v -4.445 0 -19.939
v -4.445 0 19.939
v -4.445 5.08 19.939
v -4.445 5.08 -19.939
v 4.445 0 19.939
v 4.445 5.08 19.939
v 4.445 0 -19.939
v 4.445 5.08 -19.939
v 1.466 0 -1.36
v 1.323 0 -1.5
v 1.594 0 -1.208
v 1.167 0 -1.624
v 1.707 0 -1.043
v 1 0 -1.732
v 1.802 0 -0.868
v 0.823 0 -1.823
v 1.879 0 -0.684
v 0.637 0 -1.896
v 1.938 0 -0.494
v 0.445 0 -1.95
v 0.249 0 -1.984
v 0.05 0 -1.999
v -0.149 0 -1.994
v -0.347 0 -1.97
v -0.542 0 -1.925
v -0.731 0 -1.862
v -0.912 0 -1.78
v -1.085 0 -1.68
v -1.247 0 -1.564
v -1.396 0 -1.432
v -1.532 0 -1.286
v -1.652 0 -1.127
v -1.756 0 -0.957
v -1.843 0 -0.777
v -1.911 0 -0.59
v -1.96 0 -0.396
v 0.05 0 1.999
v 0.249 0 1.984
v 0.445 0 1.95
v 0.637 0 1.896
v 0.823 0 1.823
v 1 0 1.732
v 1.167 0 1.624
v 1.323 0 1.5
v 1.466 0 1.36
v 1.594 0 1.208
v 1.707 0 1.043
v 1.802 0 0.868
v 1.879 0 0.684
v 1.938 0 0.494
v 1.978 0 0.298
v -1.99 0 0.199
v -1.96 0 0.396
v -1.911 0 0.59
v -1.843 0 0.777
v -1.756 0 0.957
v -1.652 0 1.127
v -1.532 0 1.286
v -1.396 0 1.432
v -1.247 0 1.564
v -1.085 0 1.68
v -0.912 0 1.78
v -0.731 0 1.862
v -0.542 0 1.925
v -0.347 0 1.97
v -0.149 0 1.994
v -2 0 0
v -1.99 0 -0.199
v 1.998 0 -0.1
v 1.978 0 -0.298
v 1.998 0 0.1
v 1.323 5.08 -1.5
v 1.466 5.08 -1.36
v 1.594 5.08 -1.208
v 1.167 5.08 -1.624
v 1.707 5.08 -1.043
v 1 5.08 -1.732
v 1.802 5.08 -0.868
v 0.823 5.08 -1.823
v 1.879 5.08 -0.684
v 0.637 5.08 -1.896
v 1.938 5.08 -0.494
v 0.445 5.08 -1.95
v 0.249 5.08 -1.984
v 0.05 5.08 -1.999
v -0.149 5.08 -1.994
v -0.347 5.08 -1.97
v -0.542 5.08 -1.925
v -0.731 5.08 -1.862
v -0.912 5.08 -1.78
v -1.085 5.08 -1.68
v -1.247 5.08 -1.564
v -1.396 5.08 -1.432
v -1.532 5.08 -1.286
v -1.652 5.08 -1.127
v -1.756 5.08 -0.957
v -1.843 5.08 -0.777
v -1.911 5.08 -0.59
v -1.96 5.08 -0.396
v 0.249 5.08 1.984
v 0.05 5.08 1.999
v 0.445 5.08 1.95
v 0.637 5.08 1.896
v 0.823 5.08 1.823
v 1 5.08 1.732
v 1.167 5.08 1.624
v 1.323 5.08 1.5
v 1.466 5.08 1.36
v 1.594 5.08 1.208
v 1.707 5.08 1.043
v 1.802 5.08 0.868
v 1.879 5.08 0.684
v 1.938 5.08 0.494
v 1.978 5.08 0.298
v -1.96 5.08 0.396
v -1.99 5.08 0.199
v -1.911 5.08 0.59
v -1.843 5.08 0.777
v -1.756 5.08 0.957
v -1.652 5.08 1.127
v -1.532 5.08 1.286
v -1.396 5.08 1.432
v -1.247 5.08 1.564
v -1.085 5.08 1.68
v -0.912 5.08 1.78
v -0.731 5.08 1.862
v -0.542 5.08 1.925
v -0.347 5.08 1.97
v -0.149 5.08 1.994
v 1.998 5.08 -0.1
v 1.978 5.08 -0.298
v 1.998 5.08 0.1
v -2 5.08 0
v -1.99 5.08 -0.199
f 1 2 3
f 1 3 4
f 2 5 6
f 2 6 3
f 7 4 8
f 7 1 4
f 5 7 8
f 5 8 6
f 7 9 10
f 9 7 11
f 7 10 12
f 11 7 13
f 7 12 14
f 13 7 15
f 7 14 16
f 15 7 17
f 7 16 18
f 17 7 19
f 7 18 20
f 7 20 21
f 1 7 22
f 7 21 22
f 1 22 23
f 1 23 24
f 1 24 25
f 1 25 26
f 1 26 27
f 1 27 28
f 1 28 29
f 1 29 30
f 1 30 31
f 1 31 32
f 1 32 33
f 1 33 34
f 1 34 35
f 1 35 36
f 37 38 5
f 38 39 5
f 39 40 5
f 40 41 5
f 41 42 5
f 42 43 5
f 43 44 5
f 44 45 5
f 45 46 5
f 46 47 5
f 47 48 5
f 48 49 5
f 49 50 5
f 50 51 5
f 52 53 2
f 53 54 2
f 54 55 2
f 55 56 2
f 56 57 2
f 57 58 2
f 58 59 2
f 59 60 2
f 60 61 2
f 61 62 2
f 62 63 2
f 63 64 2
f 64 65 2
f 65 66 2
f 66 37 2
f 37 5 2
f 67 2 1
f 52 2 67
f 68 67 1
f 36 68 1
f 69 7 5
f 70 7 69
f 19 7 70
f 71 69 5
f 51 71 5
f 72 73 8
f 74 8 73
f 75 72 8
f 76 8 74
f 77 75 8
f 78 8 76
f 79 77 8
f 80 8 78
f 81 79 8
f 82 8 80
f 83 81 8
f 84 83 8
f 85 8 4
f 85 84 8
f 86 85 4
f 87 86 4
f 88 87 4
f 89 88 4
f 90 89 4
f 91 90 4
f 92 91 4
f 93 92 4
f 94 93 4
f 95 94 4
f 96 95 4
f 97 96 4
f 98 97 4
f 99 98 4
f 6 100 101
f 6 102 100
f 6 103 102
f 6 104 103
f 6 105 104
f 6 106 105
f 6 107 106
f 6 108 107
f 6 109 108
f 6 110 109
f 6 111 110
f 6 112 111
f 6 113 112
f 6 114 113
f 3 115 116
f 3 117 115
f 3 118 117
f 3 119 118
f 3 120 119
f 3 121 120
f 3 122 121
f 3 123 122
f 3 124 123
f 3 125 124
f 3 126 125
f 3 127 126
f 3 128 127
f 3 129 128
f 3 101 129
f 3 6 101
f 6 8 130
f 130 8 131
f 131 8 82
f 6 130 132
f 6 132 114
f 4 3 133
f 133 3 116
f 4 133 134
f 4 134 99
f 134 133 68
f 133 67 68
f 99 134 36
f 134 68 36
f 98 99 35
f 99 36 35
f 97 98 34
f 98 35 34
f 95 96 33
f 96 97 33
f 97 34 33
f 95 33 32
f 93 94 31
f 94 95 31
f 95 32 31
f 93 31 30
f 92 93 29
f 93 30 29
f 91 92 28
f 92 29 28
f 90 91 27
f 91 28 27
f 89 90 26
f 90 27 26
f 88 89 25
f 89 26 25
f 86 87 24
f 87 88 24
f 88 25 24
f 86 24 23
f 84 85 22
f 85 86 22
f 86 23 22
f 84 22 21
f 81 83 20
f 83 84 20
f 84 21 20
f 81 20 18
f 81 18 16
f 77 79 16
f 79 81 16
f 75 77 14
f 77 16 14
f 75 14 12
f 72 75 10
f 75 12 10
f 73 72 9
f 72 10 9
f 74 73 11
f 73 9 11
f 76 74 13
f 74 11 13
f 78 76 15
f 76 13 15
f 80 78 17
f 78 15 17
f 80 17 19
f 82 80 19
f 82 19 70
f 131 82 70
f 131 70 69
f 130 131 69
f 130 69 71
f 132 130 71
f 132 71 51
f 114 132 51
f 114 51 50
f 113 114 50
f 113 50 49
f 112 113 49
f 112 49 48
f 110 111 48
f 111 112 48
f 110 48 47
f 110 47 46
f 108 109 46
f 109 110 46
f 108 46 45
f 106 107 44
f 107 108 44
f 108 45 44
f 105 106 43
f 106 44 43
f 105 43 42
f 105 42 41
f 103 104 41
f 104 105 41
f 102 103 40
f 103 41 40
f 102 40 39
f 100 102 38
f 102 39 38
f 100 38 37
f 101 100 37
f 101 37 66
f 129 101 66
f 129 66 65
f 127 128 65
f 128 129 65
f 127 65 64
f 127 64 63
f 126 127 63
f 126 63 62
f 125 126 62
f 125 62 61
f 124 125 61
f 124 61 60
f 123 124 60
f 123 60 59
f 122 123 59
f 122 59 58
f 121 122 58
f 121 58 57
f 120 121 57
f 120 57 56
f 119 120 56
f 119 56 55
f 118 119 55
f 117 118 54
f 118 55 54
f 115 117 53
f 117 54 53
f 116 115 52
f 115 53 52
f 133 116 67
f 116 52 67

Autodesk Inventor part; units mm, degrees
ref_plane "YZ Plane" through (0, 0, 0) normal (1, 0, 0) x (0, 1, 0)
ref_plane "XZ Plane" through (0, 0, 0) normal (0, 1, 0) x (-1, 0, 0)
ref_plane "XY Plane" through (0, 0, 0) normal (0, 0, 1) x (1, 0, 0)
sketch "Sketch1" plane through (0, 0, 0) normal (0, 1, 0) x (-1, 0, 0)
  line L0 (-4.445, 19.939) -> (4.445, 19.939)
  line L1 (4.445, 19.939) -> (4.445, -19.939)
  line L2 (4.445, -19.939) -> (-4.445, -19.939)
  line L3 (-4.445, -19.939) -> (-4.445, 19.939)
  line L4 (-4.445, 19.939) -> (4.445, -19.939) construction
  line L5 (4.445, 19.939) -> (-4.445, -19.939) construction
  circle A0 centre (0, 0) radius 2
  dimension "d0" = 8.89
  dimension "d1" = 39.878
  dimension "d2" = 4
extrude "Extrusion1" add sketch "Sketch1" along normal blind 5.08
properties part number "BeltMount"
